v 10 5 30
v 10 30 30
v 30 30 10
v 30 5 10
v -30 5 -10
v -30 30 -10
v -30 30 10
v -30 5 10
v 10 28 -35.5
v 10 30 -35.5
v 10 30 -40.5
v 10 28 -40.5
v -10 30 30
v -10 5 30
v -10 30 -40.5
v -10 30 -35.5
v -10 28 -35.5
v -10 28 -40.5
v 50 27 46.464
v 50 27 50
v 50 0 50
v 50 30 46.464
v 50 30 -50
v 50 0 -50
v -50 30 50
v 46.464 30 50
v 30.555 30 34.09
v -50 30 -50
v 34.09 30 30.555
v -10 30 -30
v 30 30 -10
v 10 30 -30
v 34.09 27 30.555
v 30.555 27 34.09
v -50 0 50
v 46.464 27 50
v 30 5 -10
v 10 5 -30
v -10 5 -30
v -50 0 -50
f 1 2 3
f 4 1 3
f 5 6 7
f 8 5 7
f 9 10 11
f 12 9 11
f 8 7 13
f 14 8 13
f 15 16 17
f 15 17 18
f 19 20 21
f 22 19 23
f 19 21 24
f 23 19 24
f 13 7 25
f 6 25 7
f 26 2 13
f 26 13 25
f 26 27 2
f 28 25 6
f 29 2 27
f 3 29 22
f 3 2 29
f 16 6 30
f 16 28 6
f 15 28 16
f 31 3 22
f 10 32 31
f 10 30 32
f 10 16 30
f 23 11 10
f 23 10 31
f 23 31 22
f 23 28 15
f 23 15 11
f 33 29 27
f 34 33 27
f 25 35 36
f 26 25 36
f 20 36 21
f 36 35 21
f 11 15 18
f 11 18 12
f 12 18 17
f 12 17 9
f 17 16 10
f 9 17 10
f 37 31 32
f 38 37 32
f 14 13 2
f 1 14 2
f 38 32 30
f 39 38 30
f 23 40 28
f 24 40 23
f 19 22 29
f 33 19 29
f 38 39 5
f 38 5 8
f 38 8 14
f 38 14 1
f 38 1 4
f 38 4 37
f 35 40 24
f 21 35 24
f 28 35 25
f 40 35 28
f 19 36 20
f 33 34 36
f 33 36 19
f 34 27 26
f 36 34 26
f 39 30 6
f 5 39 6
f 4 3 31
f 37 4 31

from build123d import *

# Parameters (mm, degrees)
SKETCH1_W                    = 100
SKETCH1_H                    = 100
BOSS_EXTRUDE1_DEPTH          = 30
CUT_EXTRUDE1_DEPTH           = 25
SKETCH3_W                    = 20
SKETCH3_H                    = 5
CUT_EXTRUDE_THIN1_DEPTH      = 2
CUT_EXTRUDE_THIN2_DEPTH      = 1
CUT_EXTRUDE_THIN2_DEPTH_BACK = 3


with BuildPart() as part:
    # Sketch1 → Boss-Extrude1 (new body)
    with BuildSketch(Plane(origin=(0, 0, 0), x_dir=(1, 0, 0), z_dir=(0, 1, 0))):
        Rectangle(SKETCH1_W, SKETCH1_H)
    extrude(amount=BOSS_EXTRUDE1_DEPTH)

    # Sketch2 → Cut-Extrude1 (cut)
    with BuildSketch(Plane(origin=(0, 30, 0), x_dir=(1, 0, 0), z_dir=(0, 1, 0))):
        Polygon((30, 10), (10, 30), (-10, 30), (-30, 10), (-30, -10), (-10, -30), (10, -30), (30, -10), align=None)
    extrude(amount=-CUT_EXTRUDE1_DEPTH, mode=Mode.SUBTRACT)

    # Sketch3 → Cut-Extrude-Thin1 (cut)
    with BuildSketch(Plane(origin=(0, 30, 0), x_dir=(1, 0, 0), z_dir=(0, 1, 0))):
        with Locations((0, 38)):
            Rectangle(SKETCH3_W, SKETCH3_H)
    extrude(amount=-CUT_EXTRUDE_THIN1_DEPTH, mode=Mode.SUBTRACT)

    # Sketch4 → Cut-Extrude-Thin2 (cut, two sides)
    with BuildSketch(Plane(origin=(0, 30, 0), x_dir=(1, 0, 0), z_dir=(0, 1, 0))) as cut_extrude_thin2_sk:
        Polygon((51.767766953, -48.232233047), (34.090097423, -30.554563517), (30.554563517, -34.090097423), (48.232233047, -51.767766953), align=None)
    extrude(amount=CUT_EXTRUDE_THIN2_DEPTH, mode=Mode.SUBTRACT)
    extrude(cut_extrude_thin2_sk.sketch, amount=-CUT_EXTRUDE_THIN2_DEPTH_BACK, mode=Mode.SUBTRACT)


solid = part.part
